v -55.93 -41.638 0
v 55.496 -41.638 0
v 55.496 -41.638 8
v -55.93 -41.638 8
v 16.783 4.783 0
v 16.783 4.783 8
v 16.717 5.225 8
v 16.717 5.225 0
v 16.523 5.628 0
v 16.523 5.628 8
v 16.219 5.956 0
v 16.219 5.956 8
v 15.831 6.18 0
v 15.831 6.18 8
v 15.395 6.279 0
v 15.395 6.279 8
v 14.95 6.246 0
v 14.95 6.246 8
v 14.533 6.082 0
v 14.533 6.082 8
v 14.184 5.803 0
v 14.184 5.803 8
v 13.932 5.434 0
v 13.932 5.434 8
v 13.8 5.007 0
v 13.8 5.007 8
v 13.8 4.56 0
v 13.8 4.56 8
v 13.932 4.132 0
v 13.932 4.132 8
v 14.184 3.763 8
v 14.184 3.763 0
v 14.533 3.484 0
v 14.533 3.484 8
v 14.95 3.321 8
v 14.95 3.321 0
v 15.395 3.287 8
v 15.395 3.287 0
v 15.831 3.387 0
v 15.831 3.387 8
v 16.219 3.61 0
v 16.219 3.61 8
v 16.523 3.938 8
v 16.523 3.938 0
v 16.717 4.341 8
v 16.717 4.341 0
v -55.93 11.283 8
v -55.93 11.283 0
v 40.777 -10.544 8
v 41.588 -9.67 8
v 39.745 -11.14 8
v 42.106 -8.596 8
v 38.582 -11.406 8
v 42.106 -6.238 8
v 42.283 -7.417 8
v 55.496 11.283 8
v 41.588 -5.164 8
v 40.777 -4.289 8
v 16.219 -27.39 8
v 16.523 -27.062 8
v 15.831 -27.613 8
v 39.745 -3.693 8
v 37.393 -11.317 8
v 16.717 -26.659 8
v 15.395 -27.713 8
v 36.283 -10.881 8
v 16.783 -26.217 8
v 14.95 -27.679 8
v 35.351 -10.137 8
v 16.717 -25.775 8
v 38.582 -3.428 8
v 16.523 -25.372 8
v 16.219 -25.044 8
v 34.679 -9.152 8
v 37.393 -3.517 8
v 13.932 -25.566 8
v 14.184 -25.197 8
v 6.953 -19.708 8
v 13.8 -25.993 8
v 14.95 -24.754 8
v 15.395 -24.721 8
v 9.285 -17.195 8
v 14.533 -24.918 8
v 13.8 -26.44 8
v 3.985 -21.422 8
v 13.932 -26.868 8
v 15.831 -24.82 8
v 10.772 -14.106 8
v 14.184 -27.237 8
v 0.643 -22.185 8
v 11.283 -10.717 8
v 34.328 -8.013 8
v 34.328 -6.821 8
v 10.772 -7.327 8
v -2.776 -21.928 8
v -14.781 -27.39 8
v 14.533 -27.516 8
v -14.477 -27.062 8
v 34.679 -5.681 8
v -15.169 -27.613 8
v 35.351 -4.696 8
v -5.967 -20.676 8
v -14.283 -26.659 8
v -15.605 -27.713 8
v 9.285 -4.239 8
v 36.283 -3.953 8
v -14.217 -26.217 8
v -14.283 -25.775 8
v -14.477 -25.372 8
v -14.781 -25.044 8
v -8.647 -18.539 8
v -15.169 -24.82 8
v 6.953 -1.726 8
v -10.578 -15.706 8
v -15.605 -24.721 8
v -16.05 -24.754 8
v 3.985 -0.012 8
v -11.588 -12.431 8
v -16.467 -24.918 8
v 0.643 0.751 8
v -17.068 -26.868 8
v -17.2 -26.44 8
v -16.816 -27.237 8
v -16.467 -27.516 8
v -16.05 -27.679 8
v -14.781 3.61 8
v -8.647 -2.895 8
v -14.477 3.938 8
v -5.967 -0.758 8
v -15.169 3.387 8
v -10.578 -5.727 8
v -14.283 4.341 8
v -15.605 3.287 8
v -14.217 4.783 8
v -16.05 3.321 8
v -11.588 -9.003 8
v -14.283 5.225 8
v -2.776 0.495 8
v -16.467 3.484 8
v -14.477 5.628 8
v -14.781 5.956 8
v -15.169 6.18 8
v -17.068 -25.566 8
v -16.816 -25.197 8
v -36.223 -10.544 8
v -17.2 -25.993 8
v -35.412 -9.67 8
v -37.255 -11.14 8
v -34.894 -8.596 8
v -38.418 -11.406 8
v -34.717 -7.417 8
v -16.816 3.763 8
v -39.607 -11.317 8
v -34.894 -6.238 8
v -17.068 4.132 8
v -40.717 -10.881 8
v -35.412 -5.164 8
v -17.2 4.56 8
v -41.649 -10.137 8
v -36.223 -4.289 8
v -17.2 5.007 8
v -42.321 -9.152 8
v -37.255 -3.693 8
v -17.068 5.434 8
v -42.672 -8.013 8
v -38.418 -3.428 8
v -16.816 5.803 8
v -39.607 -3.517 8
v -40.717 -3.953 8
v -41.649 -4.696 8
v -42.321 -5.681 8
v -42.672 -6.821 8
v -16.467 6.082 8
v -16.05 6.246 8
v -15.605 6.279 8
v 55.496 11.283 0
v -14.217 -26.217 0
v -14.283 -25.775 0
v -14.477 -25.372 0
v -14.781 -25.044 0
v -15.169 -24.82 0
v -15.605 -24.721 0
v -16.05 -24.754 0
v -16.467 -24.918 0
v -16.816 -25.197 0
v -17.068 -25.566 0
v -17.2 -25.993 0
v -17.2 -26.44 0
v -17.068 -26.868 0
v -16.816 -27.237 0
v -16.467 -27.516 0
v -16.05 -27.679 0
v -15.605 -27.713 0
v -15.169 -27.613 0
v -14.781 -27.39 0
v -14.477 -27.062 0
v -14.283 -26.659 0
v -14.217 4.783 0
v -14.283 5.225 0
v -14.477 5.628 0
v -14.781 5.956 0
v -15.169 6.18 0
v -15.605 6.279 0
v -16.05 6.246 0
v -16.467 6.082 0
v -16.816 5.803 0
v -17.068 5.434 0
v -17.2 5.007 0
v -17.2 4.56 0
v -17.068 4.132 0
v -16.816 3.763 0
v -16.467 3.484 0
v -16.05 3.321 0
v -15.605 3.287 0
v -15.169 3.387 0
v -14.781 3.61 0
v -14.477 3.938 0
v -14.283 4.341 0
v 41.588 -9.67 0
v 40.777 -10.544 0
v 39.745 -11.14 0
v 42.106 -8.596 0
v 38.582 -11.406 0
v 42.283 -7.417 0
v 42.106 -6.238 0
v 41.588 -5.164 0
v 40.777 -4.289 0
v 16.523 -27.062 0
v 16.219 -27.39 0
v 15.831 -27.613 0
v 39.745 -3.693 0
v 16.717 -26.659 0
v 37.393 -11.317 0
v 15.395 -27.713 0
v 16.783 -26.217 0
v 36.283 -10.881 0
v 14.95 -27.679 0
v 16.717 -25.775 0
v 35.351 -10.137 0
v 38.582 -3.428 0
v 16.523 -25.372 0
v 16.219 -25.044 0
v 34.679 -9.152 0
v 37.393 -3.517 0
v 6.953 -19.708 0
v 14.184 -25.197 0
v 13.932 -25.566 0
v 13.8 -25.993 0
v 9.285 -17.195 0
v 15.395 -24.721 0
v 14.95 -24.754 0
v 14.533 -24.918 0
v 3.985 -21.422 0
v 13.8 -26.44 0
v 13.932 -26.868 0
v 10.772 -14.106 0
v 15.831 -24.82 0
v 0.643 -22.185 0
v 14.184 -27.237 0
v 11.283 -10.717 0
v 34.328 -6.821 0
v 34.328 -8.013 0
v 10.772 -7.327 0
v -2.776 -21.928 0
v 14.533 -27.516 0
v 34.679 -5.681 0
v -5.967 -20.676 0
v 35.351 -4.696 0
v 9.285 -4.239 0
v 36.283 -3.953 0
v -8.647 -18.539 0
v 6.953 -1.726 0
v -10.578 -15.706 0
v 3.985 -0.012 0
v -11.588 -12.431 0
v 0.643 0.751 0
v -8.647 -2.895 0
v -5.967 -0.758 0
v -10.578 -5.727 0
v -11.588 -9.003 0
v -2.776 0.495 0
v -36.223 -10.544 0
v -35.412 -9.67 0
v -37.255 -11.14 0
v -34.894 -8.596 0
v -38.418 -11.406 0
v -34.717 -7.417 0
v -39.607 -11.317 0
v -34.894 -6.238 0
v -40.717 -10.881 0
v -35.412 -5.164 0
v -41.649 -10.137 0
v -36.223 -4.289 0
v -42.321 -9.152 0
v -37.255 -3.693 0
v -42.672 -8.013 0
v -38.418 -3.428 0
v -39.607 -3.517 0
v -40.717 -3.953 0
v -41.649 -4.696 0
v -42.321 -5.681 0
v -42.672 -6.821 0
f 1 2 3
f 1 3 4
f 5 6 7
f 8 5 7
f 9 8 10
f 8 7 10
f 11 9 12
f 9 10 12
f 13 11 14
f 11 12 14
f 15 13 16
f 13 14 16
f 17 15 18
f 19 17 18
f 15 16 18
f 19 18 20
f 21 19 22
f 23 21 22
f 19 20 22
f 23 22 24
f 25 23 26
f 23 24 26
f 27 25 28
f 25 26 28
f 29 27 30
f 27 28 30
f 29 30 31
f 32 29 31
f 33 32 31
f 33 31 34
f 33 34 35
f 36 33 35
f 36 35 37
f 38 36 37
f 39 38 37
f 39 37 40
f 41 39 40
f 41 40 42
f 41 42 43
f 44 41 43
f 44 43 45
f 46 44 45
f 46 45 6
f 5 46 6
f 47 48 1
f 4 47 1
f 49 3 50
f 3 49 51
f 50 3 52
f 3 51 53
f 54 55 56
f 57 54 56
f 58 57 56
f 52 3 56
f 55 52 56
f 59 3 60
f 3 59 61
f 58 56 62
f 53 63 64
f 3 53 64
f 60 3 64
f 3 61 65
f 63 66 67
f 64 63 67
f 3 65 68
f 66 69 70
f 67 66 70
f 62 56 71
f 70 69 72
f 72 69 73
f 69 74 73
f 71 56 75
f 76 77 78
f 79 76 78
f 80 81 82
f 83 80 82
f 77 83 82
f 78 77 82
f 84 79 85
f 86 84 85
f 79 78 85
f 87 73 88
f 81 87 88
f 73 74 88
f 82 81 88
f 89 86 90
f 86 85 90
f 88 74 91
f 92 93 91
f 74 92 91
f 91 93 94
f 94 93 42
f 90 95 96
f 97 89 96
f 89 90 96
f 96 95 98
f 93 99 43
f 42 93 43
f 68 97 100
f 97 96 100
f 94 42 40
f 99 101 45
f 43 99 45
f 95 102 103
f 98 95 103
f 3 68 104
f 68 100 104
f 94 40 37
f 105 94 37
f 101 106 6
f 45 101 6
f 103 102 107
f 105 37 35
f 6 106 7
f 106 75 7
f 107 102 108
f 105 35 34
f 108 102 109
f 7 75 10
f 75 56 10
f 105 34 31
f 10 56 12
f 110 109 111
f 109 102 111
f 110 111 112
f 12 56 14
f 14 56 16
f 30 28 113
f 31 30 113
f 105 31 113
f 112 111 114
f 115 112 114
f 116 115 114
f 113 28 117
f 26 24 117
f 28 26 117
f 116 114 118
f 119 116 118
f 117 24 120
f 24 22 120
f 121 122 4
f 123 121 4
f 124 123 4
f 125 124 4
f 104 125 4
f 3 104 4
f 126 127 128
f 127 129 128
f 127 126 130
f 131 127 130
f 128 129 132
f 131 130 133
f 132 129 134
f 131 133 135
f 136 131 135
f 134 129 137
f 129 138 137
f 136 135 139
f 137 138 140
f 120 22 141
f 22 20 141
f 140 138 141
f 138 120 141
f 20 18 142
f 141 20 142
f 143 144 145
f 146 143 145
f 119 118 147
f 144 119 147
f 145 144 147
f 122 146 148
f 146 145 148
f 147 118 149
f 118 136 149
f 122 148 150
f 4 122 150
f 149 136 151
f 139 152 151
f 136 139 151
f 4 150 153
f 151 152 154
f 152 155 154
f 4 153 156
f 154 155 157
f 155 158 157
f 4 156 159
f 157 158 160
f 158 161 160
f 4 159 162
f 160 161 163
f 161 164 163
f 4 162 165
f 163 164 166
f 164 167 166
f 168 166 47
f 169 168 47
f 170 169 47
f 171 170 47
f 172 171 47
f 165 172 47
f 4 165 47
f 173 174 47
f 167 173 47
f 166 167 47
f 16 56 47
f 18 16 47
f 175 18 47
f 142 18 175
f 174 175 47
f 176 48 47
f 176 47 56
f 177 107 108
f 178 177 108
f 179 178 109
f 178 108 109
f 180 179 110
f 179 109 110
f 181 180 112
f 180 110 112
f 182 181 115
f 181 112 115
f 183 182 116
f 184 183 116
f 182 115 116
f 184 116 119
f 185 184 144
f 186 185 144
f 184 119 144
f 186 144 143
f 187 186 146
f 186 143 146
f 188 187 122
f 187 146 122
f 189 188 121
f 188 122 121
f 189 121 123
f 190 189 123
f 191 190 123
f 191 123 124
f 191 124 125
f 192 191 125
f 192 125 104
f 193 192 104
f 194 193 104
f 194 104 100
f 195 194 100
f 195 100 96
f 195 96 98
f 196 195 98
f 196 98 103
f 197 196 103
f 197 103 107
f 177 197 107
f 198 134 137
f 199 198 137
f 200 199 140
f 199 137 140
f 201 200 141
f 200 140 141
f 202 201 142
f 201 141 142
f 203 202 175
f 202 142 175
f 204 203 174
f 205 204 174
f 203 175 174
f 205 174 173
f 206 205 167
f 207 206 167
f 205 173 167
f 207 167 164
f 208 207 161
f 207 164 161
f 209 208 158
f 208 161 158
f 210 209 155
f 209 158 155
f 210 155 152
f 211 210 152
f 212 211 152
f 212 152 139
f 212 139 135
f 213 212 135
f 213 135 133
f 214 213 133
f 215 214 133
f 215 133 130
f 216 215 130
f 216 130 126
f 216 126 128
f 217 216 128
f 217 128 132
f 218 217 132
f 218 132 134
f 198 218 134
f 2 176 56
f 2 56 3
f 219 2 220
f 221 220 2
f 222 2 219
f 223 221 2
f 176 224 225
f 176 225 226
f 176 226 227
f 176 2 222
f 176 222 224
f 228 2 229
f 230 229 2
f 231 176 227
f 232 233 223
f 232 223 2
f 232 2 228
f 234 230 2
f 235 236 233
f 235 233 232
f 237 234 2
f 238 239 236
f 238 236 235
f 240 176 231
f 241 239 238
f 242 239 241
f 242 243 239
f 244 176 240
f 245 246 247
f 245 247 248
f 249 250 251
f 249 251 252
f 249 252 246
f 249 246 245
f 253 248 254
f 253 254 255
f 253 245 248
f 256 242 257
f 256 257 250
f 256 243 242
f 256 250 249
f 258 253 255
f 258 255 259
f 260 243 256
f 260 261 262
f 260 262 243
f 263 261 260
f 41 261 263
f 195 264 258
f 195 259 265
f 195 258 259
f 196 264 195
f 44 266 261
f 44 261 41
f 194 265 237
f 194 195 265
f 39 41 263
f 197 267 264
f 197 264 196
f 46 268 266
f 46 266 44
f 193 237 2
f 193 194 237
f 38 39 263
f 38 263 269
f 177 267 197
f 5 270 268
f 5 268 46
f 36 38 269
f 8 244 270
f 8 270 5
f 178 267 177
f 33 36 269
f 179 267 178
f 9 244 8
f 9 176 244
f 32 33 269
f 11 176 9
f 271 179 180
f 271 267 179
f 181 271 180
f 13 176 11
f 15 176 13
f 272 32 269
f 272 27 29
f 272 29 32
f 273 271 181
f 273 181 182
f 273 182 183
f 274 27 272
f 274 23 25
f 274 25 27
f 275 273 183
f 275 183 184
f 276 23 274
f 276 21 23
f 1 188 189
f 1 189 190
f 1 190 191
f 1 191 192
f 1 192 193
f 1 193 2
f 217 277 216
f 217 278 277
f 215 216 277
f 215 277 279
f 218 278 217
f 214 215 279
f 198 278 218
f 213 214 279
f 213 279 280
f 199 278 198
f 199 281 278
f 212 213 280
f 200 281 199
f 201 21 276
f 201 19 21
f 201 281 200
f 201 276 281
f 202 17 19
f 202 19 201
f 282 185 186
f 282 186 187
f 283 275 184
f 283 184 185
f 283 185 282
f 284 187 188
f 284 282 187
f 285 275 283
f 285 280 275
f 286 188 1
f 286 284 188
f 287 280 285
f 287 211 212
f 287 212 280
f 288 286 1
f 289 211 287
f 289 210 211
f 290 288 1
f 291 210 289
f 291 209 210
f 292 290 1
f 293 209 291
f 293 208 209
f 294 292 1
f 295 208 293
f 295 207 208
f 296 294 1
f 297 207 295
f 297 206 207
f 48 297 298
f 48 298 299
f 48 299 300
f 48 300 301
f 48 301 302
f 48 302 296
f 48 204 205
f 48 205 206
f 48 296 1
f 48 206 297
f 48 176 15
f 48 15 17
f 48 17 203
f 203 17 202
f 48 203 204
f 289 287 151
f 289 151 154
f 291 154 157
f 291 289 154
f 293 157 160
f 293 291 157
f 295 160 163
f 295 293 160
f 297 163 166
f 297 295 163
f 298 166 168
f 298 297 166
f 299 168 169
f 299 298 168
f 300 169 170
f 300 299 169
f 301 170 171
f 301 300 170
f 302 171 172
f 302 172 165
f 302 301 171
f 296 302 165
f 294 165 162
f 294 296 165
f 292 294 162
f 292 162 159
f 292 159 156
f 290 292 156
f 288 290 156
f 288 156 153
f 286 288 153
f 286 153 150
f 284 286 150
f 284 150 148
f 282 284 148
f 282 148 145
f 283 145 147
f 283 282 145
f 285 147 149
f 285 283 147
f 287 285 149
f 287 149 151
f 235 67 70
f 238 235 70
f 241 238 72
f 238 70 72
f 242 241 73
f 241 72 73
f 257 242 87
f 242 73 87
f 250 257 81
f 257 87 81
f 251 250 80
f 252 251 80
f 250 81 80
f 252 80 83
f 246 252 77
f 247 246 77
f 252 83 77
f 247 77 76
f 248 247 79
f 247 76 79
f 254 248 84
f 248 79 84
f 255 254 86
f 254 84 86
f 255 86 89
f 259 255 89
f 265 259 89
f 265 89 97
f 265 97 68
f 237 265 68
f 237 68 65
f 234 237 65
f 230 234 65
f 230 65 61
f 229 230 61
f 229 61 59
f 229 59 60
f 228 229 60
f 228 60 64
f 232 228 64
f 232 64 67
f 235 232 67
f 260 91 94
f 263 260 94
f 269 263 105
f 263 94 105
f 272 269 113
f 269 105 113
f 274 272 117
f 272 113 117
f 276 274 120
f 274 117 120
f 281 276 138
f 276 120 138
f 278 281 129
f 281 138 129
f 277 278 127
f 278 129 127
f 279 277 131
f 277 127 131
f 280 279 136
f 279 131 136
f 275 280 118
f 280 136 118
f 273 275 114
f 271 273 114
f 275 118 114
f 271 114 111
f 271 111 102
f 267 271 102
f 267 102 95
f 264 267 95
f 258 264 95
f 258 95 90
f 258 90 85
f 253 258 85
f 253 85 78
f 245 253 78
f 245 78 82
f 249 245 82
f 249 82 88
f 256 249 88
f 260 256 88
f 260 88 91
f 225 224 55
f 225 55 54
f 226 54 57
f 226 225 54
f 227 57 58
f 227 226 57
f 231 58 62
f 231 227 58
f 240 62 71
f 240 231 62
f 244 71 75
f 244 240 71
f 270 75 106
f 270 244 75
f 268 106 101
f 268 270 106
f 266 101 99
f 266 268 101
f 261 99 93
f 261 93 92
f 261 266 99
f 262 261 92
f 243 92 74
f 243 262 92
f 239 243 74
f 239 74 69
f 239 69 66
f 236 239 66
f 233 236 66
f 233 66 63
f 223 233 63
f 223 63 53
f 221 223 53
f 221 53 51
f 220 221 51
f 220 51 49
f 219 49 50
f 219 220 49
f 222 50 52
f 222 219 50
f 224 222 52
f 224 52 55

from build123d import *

# Parameters (mm, degrees)
SKETCH1_R           = 4
SKETCH1_R_2         = 5
BOSS_EXTRUDE1_DEPTH = 8
SKETCH2_R           = 11.5
SKETCH2_R_2         = 1.5
CUT_EXTRUDE1_DEPTH  = 9


with BuildPart() as part:
    # Sketch1 → Boss-Extrude1 (new body)
    with BuildSketch(Plane.XY):
        Polygon((-55.929590299, 11.283196531), (55.49624814, 11.283196531), (55.49624814, -41.637870342), (-55.929590299, -41.637870342), (-55.929590299, -36.557898132), align=None)
        with Locations((38.28332892, -7.416803469)):
            Circle(SKETCH1_R, mode=Mode.SUBTRACT)
        with Locations((-0.21667108, -10.716803469)):
            Circle(SKETCH1_R_2, mode=Mode.SUBTRACT)
        with Locations((-38.71667108, -7.416803469)):
            Circle(SKETCH1_R, mode=Mode.SUBTRACT)
    extrude(amount=BOSS_EXTRUDE1_DEPTH)

    # Sketch2 → Cut-Extrude1 (cut, through all)
    with BuildSketch(Plane.XY.offset(8)):
        with Locations((-0.21667108, -10.716803469)):
            Circle(SKETCH2_R)
        with Locations((-15.71667108, -26.216803469)):
            Circle(SKETCH2_R_2)
        with Locations((15.28332892, -26.216803469)):
            Circle(SKETCH2_R_2)
        with Locations((-15.71667108, 4.783196531)):
            Circle(SKETCH2_R_2)
        with Locations((15.28332892, 4.783196531)):
            Circle(SKETCH2_R_2)
    extrude(amount=-CUT_EXTRUDE1_DEPTH, mode=Mode.SUBTRACT)


solid = part.part
